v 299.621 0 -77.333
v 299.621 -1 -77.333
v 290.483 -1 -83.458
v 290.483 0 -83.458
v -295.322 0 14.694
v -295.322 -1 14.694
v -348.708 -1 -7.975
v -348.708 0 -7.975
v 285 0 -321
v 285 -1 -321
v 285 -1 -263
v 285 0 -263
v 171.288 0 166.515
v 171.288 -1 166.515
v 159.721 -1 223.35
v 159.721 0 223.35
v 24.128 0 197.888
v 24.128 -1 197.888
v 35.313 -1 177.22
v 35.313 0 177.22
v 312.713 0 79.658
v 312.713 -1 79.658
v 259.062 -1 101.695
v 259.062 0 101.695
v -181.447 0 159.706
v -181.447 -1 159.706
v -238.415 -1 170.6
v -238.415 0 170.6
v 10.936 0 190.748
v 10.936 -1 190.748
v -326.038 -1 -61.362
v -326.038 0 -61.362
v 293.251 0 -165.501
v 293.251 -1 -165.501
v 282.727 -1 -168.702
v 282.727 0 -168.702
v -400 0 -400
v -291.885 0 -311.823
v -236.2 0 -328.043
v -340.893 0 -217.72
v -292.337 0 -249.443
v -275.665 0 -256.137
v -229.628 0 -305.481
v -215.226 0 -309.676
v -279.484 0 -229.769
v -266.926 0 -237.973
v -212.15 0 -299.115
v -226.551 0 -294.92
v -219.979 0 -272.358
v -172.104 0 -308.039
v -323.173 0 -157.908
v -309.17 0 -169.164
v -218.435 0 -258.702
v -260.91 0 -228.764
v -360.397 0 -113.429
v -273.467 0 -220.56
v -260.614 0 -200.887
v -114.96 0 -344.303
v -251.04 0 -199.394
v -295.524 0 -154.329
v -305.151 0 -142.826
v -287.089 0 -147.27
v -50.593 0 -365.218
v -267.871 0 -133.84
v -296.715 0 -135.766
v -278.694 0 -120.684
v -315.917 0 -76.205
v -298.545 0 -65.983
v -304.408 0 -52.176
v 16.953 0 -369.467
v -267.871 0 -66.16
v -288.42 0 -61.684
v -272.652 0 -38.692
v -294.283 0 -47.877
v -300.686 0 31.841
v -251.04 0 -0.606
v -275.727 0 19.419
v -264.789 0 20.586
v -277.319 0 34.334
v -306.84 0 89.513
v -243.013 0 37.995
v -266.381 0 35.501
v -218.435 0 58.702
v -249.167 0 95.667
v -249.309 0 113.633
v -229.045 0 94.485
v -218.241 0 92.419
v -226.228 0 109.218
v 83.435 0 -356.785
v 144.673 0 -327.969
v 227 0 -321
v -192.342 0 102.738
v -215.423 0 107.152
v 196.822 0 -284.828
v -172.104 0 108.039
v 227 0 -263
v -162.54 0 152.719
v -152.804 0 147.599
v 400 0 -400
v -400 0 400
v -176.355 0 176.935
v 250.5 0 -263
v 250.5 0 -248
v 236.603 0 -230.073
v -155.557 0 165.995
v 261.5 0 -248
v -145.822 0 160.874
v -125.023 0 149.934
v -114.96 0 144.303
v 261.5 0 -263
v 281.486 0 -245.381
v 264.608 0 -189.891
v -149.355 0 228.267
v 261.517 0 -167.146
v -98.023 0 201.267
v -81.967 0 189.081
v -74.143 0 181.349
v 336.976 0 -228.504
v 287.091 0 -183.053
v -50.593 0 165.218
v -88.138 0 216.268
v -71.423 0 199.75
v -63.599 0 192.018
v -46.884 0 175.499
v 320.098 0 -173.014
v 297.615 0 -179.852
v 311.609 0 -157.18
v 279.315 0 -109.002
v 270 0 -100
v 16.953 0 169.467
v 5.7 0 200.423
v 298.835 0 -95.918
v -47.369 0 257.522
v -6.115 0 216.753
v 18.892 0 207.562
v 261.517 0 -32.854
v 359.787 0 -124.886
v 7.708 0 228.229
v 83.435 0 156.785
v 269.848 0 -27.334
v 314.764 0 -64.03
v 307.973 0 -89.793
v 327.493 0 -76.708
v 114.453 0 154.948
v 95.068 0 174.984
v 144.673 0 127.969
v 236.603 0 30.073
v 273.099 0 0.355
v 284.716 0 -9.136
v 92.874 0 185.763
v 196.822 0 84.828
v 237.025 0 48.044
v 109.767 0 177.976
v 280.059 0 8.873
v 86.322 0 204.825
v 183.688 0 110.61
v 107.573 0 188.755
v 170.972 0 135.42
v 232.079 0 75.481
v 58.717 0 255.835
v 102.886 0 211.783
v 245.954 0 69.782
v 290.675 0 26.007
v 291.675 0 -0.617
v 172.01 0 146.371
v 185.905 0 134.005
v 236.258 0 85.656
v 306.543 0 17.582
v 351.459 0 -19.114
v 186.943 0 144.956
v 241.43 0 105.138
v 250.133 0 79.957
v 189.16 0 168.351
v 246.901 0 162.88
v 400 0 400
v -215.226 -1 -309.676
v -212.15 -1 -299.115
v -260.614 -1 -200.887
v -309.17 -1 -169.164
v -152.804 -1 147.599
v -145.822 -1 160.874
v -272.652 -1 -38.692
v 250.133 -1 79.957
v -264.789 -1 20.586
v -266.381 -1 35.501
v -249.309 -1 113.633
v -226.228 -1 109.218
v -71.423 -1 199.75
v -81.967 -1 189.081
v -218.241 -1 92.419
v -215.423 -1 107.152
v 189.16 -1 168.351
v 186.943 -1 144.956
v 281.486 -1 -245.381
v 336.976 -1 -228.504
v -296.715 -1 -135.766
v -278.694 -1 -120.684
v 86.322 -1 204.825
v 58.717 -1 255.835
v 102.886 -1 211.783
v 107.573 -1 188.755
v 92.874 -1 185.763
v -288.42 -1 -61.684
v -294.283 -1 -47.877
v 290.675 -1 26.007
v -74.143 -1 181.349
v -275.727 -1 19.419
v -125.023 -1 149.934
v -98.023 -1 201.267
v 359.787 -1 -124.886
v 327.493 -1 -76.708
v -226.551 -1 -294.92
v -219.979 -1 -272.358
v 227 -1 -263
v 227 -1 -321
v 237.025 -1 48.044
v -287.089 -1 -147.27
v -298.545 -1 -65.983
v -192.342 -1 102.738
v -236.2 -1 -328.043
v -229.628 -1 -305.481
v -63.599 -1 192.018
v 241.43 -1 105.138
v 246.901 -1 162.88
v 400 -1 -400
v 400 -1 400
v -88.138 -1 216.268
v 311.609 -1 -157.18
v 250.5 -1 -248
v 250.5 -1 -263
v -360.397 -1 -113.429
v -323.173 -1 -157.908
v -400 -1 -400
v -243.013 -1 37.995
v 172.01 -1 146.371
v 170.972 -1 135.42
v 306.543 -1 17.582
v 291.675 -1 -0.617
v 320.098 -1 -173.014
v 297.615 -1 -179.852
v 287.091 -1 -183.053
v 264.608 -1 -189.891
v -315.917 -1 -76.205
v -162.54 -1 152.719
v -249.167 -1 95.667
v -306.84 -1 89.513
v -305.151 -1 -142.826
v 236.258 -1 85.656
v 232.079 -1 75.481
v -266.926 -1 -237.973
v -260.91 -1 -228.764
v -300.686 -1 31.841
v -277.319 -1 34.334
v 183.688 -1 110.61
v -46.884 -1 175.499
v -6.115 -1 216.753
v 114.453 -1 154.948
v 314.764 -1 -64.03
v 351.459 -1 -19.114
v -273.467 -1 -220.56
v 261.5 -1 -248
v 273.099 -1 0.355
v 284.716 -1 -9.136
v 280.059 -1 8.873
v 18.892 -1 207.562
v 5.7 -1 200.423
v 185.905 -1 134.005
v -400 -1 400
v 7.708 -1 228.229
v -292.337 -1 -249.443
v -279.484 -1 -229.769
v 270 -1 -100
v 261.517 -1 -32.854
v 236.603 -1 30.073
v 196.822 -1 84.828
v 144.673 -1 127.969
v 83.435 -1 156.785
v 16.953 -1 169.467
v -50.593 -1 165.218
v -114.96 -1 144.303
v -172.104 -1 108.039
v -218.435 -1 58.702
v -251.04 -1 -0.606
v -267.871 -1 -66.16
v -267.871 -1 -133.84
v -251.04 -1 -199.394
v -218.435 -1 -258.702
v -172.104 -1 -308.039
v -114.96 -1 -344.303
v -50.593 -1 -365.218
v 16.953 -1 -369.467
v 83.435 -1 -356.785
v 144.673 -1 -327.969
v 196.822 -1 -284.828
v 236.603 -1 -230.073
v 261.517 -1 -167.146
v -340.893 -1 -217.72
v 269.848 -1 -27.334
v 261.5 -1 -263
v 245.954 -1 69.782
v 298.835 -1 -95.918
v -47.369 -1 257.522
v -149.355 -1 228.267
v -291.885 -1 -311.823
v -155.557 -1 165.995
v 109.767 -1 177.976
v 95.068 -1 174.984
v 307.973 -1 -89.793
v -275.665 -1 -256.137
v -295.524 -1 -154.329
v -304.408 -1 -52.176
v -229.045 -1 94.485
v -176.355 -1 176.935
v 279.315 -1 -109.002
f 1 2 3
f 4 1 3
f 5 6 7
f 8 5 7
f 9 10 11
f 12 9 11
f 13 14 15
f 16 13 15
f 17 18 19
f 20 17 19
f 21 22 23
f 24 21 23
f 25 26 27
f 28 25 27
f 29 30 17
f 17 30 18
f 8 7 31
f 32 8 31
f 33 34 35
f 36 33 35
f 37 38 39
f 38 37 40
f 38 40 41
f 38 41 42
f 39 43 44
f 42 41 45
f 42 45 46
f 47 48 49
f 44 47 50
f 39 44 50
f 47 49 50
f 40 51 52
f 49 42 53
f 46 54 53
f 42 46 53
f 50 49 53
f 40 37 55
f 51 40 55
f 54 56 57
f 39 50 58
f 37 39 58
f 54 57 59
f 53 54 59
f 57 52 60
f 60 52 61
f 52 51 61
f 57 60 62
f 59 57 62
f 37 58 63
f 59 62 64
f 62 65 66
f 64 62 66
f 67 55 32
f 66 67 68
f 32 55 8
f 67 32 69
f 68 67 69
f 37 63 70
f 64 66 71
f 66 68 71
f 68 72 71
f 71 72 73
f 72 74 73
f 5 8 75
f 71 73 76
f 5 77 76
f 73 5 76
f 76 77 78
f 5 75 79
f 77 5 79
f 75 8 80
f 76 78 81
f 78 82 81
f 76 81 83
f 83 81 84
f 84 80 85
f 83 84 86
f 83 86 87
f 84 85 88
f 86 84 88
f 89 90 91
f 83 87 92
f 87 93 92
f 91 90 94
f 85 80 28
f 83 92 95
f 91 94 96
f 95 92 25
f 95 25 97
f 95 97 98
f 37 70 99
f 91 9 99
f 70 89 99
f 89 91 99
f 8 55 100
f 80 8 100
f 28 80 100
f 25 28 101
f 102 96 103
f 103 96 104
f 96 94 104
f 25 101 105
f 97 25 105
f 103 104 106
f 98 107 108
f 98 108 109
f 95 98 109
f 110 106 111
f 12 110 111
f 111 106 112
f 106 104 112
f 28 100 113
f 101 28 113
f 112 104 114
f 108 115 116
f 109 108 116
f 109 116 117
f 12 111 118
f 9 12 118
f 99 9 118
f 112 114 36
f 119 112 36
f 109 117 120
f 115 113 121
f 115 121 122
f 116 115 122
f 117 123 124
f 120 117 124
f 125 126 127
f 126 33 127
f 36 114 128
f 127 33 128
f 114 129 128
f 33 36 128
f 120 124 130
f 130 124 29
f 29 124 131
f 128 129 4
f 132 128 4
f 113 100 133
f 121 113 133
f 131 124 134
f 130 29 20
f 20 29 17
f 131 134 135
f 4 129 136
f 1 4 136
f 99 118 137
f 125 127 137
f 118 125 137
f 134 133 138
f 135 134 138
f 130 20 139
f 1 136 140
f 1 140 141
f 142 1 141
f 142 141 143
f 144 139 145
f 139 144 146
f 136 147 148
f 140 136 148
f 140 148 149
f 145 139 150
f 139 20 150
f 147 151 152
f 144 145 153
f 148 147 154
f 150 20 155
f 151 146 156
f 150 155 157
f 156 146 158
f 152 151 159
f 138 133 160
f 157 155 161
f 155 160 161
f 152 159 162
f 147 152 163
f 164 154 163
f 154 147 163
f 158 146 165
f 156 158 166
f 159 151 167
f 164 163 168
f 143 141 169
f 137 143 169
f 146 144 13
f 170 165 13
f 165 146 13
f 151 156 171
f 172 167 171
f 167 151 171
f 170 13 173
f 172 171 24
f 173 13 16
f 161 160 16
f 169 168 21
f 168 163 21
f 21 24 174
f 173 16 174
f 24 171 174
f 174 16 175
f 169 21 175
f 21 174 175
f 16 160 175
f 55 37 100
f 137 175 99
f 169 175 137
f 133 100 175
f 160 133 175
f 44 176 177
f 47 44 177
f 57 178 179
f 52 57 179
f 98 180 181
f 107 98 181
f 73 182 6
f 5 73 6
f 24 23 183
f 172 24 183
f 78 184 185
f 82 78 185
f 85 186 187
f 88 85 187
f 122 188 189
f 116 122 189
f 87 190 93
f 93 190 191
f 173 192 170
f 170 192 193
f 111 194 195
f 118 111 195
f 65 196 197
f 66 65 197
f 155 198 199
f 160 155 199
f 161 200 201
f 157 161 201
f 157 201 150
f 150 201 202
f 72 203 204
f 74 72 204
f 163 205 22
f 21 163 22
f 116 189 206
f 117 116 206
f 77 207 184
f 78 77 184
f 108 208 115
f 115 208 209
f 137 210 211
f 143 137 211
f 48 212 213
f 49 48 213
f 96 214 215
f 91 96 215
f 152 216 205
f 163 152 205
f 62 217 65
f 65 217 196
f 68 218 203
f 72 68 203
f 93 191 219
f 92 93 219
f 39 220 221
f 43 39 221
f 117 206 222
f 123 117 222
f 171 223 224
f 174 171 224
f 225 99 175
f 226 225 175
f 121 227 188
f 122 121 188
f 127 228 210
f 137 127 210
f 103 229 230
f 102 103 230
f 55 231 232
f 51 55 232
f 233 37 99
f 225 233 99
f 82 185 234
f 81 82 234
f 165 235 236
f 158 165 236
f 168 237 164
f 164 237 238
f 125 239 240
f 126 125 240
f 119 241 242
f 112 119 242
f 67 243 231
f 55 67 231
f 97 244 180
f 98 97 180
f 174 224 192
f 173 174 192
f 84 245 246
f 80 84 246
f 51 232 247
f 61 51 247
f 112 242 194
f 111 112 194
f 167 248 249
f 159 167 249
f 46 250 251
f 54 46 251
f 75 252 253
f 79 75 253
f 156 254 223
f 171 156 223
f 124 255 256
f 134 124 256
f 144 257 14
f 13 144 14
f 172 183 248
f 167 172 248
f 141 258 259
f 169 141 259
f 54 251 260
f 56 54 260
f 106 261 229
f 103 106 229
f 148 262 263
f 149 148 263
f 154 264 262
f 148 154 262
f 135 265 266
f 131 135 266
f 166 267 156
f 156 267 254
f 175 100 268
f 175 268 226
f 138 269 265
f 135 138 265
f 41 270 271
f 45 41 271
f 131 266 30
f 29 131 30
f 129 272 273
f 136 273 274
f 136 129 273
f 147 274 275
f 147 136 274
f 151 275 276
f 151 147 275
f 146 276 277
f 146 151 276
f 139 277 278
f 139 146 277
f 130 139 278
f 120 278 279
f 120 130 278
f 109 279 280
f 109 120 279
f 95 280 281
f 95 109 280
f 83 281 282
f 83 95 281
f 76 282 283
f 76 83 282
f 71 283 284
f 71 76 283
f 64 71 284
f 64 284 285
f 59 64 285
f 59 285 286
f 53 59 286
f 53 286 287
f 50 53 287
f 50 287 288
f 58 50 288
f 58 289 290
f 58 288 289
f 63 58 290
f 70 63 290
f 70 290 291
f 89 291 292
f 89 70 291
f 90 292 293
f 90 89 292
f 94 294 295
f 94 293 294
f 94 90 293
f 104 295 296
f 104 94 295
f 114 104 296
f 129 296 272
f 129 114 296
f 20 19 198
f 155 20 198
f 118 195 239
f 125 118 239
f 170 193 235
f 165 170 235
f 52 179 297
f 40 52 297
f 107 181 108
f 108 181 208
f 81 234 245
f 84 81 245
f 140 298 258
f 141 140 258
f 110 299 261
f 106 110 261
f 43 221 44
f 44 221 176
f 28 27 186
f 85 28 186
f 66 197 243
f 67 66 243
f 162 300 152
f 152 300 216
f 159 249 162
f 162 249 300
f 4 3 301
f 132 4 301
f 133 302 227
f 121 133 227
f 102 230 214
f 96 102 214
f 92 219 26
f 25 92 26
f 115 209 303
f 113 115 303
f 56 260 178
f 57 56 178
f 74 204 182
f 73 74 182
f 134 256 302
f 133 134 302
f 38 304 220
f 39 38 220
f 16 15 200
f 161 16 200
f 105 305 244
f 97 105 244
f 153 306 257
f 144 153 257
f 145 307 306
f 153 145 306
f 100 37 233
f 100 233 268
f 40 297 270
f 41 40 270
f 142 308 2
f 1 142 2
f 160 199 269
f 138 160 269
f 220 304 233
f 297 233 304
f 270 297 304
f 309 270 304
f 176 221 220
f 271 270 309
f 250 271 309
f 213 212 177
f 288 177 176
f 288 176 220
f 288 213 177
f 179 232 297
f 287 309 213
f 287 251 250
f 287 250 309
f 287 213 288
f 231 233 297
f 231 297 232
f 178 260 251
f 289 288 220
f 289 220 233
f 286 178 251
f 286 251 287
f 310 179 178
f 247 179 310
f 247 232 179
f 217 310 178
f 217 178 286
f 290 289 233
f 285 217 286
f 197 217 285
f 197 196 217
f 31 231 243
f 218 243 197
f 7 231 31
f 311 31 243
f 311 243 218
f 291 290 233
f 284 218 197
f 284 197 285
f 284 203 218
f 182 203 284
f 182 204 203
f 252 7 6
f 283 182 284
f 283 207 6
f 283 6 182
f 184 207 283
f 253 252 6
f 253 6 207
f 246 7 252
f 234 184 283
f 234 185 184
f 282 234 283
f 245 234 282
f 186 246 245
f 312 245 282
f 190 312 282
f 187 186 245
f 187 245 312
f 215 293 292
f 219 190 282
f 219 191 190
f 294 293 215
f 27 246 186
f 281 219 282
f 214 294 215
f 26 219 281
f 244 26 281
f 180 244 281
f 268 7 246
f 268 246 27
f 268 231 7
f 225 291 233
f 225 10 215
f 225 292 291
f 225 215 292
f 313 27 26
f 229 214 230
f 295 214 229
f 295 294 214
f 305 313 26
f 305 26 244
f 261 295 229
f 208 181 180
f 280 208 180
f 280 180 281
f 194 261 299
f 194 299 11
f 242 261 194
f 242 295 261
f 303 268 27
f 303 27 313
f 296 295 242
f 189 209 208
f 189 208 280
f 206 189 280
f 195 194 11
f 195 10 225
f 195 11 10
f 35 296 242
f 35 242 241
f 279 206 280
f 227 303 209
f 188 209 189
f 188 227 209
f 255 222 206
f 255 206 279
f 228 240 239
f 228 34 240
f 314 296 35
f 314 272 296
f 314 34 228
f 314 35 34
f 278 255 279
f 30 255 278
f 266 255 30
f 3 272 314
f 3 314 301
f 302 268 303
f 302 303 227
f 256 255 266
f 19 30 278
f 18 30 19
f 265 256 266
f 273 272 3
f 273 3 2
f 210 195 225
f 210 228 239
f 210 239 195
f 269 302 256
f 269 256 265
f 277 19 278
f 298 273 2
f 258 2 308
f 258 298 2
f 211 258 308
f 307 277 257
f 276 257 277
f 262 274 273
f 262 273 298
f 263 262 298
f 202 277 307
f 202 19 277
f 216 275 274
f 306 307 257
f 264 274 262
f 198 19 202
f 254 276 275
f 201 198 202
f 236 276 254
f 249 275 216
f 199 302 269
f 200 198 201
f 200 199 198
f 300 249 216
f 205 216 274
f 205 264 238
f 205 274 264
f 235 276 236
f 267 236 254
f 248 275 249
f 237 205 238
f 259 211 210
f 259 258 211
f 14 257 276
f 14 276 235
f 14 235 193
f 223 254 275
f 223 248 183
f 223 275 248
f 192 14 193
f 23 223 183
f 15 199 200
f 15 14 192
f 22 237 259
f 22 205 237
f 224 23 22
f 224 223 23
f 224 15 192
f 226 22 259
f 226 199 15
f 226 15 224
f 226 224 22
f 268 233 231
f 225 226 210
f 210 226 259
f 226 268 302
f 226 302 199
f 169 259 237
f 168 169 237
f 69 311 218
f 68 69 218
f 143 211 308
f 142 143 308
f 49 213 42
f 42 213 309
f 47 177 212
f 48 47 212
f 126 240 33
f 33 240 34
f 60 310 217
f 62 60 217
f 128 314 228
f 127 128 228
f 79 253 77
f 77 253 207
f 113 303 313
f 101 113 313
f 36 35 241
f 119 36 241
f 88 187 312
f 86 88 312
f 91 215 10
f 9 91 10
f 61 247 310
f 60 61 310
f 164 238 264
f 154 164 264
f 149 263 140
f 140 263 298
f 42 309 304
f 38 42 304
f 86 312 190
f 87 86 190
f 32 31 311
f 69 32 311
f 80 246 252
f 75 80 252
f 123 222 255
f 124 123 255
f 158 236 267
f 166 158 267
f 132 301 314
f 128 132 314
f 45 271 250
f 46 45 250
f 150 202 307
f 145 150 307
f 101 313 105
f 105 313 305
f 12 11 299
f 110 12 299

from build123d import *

# Parameters (mm, degrees)
F0_W     = 800
F0_H     = 800
F1_DEPTH = 1
F2_R     = 270
F3_DEPTH = 3
F5_DEPTH = 1


with BuildPart() as f1:
    # F0 (on Front) → F1 (new body)
    with BuildSketch(Plane.XZ):
        Rectangle(F0_W, F0_H)
    extrude(amount=F1_DEPTH)

    # F2 (on Front) → F3 (cut)
    with BuildSketch(Plane.XZ):
        with Locations((0, -100)):
            Circle(F2_R)
    extrude(amount=F3_DEPTH, mode=Mode.SUBTRACT)

    # F4 (on face) → F5 (cut, through all)
    with BuildSketch(Plane.XZ.offset(1)):
        Polygon((250.5, -263), (227, -263), (227, -321), (285, -321), (285, -263), (261.5, -263), (261.5, -248), (250.5, -248), align=None)
        Polygon((320.098432, -173.013655), (297.615381, -179.851959), (293.250506, -165.501075), (282.726524, -168.701983), (287.091399, -183.052867), (264.608347, -189.89117), (281.485863, -245.381255), (336.975947, -228.50374), align=None)
        Polygon((327.492726, -76.708065), (307.972505, -89.792825), (299.62053, -77.333109), (290.483405, -83.457891), (298.83538, -95.917606), (279.315158, -109.002367), (311.609459, -157.179935), (359.787028, -124.885634), align=None)
        Polygon((306.542915, 17.581635), (291.674975, -0.617111), (280.058755, 8.873064), (273.099293, 0.354502), (284.715514, -9.135673), (269.847574, -27.334419), (314.763629, -64.02976), (351.45897, -19.113706), align=None)
        Polygon((259.062181, 101.694786), (250.133325, 79.957133), (236.258228, 85.656403), (232.078763, 75.481331), (245.95386, 69.782062), (237.025005, 48.044409), (290.675381, 26.007233), (312.712557, 79.65761), align=None)
        Polygon((189.159923, 168.351493), (186.942933, 144.956302), (172.009833, 146.371402), (170.972093, 135.420461), (185.905193, 134.005361), (183.688204, 110.61017), (241.429526, 105.138451), (246.901245, 162.879773), align=None)
        Polygon((102.886099, 211.782698), (107.572853, 188.754794), (92.874192, 185.763249), (95.067991, 174.98423), (109.766653, 177.975776), (114.453407, 154.947872), (171.288233, 166.51518), (159.720925, 223.350006), align=None)
        Polygon((7.707606, 228.229482), (18.892471, 207.561904), (5.7004, 200.422628), (10.935869, 190.748442), (24.12794, 197.887718), (35.312805, 177.22014), (86.322147, 204.825338), (58.716949, 255.834681), align=None)
        Polygon((-88.137971, 216.268396), (-71.423032, 199.749897), (-81.966754, 189.080787), (-74.14274, 181.348723), (-63.599017, 192.017833), (-46.884078, 175.499334), (-6.115017, 216.753227), (-47.368909, 257.522288), align=None)
        Polygon((-176.355311, 176.934657), (-155.556956, 165.994894), (-162.539784, 152.719348), (-152.804383, 147.598607), (-145.821556, 160.874153), (-125.023201, 149.93439), (-98.022934, 201.266501), (-149.355045, 228.266768), align=None)
        Polygon((-249.30931, 113.632553), (-226.227612, 109.218349), (-229.045189, 94.48535), (-218.240989, 92.419127), (-215.423412, 107.152126), (-192.341714, 102.737922), (-181.447083, 159.705518), (-238.414679, 170.60015), align=None)
        Polygon((-300.685885, 31.840807), (-277.318537, 34.334206), (-275.727006, 19.418878), (-264.789098, 20.586001), (-266.380629, 35.50133), (-243.013281, 37.994729), (-249.167203, 95.667333), (-306.839807, 89.513411), align=None)
        Polygon((-326.038455, -61.361604), (-304.407874, -52.176402), (-298.544979, -65.983156), (-288.420026, -61.6837), (-294.28292, -47.876946), (-272.652339, -38.691744), (-295.322198, 14.694373), (-348.708315, -7.975487), align=None)
        Polygon((-323.172786, -157.908122), (-305.151071, -142.826086), (-295.52424, -154.329308), (-287.088544, -147.269631), (-296.715375, -135.766409), (-278.693661, -120.684373), (-315.91741, -76.205248), (-360.396534, -113.428997), align=None)
        Polygon((-292.336897, -249.442761), (-279.483808, -229.769223), (-266.92623, -237.973322), (-260.909891, -228.764432), (-273.467468, -220.560333), (-260.614379, -200.886794), (-309.170346, -169.164277), (-340.892863, -217.720244), align=None)
        Polygon((-236.199598, -328.043307), (-229.627554, -305.480988), (-215.226074, -309.67591), (-212.149798, -299.114825), (-226.551278, -294.919903), (-219.979234, -272.357584), (-275.664957, -256.13722), (-291.885321, -311.822943), align=None)
    extrude(amount=-F5_DEPTH, mode=Mode.SUBTRACT)


solid = f1.part
